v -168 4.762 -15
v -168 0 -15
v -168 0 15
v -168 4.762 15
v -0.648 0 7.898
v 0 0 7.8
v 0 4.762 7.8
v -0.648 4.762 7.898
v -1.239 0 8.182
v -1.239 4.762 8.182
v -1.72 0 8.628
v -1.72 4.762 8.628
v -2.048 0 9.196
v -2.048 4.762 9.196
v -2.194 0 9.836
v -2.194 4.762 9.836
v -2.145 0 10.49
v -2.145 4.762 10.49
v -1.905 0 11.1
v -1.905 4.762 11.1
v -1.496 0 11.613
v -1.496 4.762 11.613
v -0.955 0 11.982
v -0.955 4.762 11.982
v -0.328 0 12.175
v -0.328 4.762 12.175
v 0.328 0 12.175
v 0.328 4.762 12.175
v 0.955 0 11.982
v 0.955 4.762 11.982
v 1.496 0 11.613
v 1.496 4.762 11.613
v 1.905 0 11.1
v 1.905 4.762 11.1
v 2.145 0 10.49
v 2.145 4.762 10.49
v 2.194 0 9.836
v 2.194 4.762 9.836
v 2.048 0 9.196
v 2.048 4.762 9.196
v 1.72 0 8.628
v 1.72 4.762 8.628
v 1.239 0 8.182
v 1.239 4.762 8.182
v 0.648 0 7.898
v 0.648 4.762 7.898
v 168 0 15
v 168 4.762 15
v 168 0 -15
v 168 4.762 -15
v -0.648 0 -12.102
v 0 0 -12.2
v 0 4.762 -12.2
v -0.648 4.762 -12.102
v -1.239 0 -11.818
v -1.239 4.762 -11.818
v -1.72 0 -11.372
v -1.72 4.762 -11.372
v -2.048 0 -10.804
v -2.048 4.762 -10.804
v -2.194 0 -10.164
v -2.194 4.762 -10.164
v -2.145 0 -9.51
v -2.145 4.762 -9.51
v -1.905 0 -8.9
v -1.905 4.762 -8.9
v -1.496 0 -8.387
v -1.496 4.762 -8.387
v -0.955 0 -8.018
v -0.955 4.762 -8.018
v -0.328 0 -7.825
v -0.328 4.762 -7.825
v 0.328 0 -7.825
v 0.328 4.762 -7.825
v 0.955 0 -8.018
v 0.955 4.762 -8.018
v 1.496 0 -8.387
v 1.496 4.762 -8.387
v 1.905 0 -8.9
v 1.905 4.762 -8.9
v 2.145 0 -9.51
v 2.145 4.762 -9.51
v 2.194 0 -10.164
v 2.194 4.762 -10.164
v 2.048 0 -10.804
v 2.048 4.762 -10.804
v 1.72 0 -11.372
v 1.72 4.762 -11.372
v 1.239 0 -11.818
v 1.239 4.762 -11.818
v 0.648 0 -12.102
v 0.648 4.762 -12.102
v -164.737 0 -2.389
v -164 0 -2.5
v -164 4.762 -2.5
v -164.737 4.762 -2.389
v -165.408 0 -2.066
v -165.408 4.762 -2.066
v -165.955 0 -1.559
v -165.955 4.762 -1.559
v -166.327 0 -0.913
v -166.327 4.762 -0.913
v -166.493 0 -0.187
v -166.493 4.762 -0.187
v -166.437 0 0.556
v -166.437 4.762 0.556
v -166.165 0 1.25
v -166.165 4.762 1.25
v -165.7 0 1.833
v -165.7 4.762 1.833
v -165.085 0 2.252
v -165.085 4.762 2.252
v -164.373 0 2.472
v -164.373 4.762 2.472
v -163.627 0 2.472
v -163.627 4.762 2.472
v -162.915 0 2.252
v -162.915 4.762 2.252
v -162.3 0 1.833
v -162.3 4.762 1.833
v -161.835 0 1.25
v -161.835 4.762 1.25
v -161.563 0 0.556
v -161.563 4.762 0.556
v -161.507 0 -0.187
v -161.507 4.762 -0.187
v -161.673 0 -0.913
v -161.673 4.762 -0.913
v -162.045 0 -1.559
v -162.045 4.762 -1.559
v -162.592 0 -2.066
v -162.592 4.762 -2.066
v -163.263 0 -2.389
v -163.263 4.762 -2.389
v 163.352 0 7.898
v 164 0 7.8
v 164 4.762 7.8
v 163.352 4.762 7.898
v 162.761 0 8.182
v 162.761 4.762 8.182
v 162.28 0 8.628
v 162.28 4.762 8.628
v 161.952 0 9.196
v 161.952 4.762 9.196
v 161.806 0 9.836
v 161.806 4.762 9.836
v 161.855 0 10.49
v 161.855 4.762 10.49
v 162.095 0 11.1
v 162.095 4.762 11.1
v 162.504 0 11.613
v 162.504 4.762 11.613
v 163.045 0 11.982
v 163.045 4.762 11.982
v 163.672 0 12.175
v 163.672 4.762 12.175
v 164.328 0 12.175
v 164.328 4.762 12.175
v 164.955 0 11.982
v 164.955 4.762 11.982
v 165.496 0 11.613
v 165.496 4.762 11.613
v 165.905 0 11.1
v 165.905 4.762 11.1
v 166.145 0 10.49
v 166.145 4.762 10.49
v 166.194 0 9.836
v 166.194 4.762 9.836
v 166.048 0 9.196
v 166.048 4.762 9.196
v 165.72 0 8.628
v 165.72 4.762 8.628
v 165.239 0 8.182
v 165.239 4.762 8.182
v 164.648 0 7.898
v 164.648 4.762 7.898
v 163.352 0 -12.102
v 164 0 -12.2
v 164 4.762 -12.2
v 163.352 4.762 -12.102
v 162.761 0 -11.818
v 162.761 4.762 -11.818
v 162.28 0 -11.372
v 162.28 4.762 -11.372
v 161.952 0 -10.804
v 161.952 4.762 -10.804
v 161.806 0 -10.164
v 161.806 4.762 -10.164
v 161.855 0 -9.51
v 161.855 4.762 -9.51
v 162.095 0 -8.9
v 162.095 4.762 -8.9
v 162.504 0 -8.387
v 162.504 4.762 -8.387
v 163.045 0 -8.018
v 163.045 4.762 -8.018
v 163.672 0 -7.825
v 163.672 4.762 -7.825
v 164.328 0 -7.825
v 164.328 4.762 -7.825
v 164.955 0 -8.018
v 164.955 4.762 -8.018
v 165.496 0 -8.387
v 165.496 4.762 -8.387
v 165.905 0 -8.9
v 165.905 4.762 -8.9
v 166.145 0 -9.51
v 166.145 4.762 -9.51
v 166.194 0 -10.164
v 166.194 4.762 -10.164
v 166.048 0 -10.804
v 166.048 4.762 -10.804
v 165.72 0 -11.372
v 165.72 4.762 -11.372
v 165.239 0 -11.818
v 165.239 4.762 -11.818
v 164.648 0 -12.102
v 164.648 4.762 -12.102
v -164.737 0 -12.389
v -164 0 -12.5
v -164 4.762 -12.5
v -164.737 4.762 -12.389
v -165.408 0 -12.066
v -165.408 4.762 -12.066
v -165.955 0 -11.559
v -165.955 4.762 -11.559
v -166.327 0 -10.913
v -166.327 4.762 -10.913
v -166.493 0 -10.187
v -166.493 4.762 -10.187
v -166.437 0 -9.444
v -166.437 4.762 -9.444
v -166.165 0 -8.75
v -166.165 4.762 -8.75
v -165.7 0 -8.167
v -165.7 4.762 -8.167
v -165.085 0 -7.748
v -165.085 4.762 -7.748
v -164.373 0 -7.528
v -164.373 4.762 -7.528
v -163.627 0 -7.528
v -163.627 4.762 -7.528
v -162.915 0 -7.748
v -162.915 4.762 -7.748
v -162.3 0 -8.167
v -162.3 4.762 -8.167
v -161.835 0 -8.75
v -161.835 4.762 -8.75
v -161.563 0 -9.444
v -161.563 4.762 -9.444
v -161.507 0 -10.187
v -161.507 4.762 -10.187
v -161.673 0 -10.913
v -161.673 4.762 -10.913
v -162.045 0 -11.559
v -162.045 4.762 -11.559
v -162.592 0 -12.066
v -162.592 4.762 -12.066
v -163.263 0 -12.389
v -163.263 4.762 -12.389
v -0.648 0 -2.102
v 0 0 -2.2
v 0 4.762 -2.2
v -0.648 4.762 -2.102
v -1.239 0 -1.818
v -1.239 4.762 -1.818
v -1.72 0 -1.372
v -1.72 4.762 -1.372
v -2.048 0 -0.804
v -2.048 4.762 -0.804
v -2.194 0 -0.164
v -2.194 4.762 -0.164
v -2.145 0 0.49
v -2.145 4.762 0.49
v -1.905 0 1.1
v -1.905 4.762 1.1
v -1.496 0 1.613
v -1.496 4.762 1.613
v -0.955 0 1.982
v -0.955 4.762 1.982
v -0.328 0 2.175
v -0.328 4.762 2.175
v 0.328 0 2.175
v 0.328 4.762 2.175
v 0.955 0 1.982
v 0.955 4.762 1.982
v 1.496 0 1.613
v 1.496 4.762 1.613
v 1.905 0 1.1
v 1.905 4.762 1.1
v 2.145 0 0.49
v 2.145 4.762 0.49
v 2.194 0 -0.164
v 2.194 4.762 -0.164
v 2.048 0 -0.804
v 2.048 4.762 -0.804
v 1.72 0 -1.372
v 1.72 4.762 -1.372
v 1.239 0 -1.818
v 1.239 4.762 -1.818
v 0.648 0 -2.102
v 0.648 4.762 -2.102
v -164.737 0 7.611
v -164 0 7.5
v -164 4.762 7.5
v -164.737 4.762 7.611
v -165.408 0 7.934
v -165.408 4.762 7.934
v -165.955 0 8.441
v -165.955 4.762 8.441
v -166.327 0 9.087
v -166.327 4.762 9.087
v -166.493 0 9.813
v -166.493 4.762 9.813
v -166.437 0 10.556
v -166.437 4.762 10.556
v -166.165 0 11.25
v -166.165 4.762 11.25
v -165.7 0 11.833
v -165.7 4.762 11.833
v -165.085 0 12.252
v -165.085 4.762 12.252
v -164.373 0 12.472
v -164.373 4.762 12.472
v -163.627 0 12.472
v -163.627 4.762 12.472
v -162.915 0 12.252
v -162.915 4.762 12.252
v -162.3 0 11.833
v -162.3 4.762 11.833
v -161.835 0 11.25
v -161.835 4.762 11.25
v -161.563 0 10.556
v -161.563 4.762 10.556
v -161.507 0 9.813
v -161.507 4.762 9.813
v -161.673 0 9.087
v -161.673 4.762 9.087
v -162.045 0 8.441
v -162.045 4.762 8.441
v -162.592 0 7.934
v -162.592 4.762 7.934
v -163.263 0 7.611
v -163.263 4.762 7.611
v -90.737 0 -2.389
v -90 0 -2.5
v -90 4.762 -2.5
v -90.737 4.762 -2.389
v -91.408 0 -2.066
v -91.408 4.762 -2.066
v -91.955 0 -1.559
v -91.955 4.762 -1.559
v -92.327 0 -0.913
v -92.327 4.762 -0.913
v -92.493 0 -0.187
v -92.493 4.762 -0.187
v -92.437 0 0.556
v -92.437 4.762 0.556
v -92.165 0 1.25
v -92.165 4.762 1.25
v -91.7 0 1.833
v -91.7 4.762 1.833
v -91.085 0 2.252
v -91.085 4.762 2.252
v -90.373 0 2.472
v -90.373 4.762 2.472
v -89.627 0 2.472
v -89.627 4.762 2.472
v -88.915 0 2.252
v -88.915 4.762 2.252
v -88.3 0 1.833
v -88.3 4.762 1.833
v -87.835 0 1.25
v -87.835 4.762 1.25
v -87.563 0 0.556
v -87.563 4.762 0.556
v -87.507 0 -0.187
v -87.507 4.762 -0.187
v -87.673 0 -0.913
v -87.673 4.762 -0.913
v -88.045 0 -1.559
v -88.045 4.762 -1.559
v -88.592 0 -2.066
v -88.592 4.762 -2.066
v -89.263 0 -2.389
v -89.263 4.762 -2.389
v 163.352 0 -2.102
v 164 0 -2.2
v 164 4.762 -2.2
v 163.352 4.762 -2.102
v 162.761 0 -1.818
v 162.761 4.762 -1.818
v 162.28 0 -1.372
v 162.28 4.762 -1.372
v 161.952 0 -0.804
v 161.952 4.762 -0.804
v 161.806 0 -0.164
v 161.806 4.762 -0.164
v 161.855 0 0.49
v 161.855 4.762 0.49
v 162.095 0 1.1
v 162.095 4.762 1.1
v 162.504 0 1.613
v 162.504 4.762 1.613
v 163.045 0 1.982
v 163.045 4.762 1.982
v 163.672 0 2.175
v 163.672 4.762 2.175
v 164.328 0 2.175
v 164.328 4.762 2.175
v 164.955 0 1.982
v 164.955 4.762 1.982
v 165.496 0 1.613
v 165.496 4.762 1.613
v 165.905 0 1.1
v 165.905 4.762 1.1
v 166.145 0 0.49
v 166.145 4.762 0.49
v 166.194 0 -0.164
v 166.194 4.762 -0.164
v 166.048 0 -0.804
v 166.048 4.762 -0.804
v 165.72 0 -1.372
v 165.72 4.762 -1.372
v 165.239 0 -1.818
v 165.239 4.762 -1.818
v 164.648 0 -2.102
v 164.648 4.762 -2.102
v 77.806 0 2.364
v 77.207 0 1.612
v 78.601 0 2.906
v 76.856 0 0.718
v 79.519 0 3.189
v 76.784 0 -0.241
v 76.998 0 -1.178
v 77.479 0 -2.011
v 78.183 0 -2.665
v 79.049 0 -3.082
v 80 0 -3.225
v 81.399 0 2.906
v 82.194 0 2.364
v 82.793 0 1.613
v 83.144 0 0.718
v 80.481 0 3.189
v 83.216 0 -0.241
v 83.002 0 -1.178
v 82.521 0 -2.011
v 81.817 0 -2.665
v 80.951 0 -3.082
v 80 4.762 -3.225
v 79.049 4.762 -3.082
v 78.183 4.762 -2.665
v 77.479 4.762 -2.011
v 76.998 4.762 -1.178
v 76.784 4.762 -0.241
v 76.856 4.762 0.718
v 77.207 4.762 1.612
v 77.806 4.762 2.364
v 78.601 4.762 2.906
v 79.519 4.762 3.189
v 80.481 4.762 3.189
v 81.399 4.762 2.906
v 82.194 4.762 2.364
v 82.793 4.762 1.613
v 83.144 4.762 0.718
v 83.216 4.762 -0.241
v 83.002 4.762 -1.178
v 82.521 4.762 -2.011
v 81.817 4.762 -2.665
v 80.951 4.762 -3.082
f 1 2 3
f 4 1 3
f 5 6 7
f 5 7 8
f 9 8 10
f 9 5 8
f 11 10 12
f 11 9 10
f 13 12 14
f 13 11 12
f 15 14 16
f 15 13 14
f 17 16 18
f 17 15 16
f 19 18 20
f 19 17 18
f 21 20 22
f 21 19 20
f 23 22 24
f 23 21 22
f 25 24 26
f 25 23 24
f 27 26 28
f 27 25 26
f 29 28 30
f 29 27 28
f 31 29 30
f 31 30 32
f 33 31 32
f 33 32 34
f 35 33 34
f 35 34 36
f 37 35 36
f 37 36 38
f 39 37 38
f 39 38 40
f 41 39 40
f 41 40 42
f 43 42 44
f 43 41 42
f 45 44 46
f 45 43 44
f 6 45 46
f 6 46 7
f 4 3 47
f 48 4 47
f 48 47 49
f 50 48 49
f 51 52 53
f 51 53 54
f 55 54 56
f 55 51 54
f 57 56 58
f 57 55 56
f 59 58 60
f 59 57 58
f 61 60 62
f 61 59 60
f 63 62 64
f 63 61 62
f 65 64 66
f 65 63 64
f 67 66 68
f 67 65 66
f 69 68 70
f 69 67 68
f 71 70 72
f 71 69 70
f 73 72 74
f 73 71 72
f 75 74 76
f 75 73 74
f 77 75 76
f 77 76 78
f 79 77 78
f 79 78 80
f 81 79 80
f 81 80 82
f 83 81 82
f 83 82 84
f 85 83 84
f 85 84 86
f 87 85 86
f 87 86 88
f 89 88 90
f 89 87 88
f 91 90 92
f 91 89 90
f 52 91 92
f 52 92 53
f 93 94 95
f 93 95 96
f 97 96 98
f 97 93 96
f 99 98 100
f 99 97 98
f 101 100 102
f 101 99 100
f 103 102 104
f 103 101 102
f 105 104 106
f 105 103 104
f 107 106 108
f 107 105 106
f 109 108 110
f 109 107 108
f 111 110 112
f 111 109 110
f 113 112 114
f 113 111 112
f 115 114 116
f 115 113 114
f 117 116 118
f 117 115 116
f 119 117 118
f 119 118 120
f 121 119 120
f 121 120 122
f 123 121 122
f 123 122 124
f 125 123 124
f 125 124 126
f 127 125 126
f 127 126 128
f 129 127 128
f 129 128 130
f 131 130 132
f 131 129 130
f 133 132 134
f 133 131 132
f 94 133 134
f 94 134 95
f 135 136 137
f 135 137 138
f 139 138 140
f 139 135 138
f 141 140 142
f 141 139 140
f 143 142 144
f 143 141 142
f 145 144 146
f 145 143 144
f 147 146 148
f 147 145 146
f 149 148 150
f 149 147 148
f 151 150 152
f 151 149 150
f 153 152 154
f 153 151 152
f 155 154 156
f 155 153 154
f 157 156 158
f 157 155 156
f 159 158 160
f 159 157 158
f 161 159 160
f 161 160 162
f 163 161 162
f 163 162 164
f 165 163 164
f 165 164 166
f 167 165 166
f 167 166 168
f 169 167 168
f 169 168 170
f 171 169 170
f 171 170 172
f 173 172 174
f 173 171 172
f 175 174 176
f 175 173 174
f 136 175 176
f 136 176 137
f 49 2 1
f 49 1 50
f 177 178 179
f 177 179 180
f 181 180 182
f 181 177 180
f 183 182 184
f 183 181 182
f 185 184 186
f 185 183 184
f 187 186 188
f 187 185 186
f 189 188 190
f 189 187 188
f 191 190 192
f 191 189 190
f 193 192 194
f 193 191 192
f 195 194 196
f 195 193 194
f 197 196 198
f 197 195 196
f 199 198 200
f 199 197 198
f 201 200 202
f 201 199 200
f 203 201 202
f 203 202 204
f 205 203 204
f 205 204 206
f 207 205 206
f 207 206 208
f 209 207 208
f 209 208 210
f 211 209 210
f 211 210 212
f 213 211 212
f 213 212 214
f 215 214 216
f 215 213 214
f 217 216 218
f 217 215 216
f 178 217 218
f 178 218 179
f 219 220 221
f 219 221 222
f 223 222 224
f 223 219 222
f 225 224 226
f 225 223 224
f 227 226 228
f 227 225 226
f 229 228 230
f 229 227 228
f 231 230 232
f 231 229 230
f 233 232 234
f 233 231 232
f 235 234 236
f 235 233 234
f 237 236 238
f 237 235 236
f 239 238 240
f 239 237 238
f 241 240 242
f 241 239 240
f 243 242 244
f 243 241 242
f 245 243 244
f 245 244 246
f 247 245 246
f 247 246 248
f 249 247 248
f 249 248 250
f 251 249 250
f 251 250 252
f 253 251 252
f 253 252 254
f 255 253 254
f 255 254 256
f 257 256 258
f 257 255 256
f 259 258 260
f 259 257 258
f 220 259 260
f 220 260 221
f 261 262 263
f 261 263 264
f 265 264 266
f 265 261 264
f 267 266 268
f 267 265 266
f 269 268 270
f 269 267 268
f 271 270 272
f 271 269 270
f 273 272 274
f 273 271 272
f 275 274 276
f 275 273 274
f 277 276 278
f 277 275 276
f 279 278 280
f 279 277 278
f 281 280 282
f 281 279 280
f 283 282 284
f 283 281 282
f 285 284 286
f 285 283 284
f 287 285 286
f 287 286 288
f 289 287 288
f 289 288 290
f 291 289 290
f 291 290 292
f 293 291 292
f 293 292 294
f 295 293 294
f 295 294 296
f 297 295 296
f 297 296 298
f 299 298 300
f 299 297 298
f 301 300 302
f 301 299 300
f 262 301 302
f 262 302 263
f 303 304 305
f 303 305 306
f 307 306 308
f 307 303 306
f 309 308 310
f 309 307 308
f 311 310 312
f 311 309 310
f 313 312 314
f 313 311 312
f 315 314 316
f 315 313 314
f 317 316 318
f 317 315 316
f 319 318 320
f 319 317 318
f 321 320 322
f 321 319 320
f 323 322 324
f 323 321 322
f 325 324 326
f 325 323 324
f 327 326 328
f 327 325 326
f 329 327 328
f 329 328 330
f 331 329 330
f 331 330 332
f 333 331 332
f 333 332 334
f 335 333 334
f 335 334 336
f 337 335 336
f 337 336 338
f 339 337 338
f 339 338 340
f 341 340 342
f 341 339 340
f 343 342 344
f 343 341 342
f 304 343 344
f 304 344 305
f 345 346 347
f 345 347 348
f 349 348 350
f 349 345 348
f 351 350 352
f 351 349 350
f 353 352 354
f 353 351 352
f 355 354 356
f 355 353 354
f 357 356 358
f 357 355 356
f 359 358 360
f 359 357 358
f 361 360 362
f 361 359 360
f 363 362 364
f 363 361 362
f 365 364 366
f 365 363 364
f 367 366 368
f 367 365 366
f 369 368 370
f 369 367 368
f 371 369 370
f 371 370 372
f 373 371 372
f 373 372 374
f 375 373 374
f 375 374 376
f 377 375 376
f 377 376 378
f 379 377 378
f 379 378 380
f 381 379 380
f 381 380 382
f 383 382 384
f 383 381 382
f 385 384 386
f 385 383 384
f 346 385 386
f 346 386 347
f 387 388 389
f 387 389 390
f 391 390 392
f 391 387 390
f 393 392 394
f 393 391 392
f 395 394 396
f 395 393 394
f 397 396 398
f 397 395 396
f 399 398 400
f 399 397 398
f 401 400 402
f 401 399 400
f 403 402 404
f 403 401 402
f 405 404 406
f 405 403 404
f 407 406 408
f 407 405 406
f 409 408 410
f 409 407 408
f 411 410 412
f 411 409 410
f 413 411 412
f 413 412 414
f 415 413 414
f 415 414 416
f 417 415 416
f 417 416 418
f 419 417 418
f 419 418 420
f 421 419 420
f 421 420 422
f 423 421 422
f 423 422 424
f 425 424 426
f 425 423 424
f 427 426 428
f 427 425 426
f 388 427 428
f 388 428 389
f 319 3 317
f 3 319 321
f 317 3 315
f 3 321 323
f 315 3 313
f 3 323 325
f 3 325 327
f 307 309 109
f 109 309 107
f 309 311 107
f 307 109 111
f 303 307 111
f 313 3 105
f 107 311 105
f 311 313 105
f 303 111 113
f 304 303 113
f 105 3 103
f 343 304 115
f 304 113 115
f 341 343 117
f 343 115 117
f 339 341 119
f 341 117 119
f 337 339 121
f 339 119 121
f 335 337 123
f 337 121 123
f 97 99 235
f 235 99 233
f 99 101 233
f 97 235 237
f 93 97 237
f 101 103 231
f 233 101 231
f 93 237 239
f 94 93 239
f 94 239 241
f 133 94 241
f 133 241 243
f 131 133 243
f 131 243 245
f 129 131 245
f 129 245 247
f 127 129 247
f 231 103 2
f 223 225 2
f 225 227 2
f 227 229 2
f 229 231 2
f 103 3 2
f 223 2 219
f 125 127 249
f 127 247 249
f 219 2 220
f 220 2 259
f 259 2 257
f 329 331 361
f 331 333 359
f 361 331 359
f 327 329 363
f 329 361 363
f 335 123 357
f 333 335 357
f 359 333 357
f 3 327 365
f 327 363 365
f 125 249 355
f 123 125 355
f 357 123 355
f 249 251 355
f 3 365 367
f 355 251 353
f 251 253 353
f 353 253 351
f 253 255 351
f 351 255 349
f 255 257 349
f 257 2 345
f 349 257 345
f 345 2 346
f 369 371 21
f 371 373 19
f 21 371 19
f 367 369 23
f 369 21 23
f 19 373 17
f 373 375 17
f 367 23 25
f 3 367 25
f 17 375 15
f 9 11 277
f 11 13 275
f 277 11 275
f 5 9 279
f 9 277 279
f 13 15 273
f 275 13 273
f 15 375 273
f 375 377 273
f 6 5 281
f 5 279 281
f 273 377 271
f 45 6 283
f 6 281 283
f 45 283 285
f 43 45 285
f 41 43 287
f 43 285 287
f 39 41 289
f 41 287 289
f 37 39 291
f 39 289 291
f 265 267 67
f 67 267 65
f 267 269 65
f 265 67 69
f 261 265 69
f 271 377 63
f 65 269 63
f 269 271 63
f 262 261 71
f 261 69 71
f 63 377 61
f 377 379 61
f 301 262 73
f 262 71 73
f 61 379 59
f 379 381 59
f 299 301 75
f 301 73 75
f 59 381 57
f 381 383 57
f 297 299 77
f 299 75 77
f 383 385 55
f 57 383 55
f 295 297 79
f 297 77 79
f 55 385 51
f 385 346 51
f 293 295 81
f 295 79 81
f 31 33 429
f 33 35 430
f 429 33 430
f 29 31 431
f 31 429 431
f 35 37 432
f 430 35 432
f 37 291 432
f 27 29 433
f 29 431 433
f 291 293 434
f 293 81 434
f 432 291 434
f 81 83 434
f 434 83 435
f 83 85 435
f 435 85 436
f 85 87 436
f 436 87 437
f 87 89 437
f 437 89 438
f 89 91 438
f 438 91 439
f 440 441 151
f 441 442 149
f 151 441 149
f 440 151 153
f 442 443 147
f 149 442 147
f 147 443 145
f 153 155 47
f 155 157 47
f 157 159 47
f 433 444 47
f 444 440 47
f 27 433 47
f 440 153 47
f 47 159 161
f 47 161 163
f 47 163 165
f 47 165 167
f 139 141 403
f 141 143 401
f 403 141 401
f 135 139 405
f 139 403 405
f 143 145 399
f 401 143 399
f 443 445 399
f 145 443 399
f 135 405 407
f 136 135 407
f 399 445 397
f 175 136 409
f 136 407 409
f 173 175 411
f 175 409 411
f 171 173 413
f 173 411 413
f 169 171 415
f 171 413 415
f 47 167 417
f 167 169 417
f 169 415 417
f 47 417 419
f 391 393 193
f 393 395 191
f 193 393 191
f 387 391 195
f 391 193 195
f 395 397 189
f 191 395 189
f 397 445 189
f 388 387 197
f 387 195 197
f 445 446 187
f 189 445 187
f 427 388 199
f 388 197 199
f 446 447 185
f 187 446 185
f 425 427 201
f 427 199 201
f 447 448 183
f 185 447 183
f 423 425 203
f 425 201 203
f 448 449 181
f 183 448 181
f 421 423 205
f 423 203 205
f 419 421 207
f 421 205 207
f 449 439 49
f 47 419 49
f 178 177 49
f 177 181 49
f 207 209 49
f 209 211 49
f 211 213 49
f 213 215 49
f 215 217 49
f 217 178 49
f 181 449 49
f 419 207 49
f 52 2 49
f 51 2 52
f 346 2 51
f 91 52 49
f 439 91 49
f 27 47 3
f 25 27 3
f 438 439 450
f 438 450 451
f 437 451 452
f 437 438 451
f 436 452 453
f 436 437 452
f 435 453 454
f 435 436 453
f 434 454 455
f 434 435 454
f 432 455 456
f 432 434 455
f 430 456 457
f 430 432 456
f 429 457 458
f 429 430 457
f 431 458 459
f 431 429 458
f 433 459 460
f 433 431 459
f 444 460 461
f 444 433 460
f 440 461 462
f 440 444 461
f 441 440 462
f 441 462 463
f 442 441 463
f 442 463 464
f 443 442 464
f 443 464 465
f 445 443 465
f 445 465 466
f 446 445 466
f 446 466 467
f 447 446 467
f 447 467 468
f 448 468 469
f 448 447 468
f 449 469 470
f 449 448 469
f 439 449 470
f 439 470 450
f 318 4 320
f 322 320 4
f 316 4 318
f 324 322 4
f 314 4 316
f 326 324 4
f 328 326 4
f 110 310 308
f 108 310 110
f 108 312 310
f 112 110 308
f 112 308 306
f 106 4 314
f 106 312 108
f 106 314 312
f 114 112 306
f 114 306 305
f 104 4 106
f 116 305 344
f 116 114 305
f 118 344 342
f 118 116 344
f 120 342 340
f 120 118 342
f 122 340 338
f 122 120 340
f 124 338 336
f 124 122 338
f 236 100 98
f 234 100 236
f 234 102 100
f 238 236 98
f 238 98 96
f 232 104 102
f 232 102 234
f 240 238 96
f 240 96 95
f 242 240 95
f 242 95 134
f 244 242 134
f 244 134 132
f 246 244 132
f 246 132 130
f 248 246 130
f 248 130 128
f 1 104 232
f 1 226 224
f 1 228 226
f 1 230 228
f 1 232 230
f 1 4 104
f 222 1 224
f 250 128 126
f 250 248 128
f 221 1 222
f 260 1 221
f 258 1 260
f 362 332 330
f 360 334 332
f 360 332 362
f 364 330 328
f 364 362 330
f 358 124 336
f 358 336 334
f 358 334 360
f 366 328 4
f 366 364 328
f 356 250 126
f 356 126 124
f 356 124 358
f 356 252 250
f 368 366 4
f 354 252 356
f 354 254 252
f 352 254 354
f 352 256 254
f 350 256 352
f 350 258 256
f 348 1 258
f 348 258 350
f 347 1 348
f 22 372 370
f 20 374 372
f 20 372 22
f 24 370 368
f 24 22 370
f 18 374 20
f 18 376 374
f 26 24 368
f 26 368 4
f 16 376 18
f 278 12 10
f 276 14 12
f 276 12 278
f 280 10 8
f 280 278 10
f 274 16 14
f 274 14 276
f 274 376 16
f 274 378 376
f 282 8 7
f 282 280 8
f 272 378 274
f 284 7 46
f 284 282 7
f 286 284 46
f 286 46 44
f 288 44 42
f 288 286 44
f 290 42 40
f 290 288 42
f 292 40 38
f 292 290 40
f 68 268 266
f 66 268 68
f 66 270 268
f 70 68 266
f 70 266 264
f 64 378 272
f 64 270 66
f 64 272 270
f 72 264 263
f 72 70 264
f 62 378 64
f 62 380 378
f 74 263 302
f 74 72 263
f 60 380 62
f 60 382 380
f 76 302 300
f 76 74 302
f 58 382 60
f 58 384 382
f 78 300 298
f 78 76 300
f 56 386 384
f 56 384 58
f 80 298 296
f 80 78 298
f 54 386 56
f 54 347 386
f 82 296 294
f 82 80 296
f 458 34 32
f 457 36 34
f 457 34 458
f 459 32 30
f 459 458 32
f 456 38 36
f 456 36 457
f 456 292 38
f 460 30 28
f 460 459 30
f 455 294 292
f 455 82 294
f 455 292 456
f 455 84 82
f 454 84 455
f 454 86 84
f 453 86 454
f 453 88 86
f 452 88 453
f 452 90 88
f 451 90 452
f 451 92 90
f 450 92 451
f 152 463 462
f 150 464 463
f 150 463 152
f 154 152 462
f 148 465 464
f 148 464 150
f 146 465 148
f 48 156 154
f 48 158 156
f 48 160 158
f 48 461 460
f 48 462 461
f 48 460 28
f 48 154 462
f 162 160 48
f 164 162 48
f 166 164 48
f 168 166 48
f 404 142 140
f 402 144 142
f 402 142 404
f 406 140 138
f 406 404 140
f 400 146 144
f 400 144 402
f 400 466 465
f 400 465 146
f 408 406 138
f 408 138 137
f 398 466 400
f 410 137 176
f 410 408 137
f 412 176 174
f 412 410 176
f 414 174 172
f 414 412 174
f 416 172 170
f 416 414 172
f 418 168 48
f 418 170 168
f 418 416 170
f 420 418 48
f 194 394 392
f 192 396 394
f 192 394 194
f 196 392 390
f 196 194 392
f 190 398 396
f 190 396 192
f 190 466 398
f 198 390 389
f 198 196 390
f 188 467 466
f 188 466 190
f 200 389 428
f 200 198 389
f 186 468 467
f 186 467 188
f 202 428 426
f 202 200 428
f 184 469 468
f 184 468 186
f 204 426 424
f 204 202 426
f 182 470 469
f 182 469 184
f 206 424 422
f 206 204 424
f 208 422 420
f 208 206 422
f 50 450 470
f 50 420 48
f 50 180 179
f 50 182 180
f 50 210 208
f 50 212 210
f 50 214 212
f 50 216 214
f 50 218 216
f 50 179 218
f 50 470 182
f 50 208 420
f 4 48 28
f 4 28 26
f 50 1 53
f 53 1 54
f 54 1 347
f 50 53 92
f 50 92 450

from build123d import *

# Parameters (mm, degrees)
ESBO_O1_R                = 2.5
ESBO_O1_R_2              = 2.2
ESBO_O1_R_3              = 3.225
ESBO_O1_W                = 8
ESBO_O1_H                = 30
RESSALTO_EXTRUS_O1_DEPTH = 4.7625


with BuildPart() as part:
    # Esboço1 → Ressalto-extrusão1 (new body)
    # profile 1 of 2: a face of its own
    with BuildSketch(Plane(origin=(0, 0, 0), x_dir=(1, 0, 0), z_dir=(0, 1, 0))):
        Polygon((-160, -15), (160, -15), (160, 15), (-160, 15), (-168, 15), (-168, -15), align=None)
        with Locations(Location((-164, -10, 0), (0, 0, 90))):
            Circle(ESBO_O1_R, mode=Mode.SUBTRACT)
        with Locations(Location((0, -10, 0), (0, 0, 90))):
            Circle(ESBO_O1_R_2, mode=Mode.SUBTRACT)
        with Locations(Location((-164, 0, 0), (0, 0, 90))):
            Circle(ESBO_O1_R, mode=Mode.SUBTRACT)
        with Locations(Location((-90, 0, 0), (0, 0, 90))):
            Circle(ESBO_O1_R, mode=Mode.SUBTRACT)
        with Locations(Location((-164, 10, 0), (0, 0, 90))):
            Circle(ESBO_O1_R, mode=Mode.SUBTRACT)
        with Locations(Location((0, 0, 0), (0, 0, 90))):
            Circle(ESBO_O1_R_2, mode=Mode.SUBTRACT)
        with Locations(Location((80, 0, 0), (0, 0, 90))):
            Circle(ESBO_O1_R_3, mode=Mode.SUBTRACT)
        with Locations(Location((0, 10, 0), (0, 0, 90))):
            Circle(ESBO_O1_R_2, mode=Mode.SUBTRACT)
    # profile 2 of 2: a face of its own
    with BuildSketch(Plane(origin=(0, 0, 0), x_dir=(1, 0, 0), z_dir=(0, 1, 0))):
        with Locations((164, 0)):
            Rectangle(ESBO_O1_W, ESBO_O1_H)
        with Locations(Location((164, -10, 0), (0, 0, 90))):
            Circle(ESBO_O1_R_2, mode=Mode.SUBTRACT)
        with Locations(Location((164, 0, 0), (0, 0, 90))):
            Circle(ESBO_O1_R_2, mode=Mode.SUBTRACT)
        with Locations(Location((164, 10, 0), (0, 0, 90))):
            Circle(ESBO_O1_R_2, mode=Mode.SUBTRACT)
    extrude(amount=RESSALTO_EXTRUS_O1_DEPTH)


solid = part.part
